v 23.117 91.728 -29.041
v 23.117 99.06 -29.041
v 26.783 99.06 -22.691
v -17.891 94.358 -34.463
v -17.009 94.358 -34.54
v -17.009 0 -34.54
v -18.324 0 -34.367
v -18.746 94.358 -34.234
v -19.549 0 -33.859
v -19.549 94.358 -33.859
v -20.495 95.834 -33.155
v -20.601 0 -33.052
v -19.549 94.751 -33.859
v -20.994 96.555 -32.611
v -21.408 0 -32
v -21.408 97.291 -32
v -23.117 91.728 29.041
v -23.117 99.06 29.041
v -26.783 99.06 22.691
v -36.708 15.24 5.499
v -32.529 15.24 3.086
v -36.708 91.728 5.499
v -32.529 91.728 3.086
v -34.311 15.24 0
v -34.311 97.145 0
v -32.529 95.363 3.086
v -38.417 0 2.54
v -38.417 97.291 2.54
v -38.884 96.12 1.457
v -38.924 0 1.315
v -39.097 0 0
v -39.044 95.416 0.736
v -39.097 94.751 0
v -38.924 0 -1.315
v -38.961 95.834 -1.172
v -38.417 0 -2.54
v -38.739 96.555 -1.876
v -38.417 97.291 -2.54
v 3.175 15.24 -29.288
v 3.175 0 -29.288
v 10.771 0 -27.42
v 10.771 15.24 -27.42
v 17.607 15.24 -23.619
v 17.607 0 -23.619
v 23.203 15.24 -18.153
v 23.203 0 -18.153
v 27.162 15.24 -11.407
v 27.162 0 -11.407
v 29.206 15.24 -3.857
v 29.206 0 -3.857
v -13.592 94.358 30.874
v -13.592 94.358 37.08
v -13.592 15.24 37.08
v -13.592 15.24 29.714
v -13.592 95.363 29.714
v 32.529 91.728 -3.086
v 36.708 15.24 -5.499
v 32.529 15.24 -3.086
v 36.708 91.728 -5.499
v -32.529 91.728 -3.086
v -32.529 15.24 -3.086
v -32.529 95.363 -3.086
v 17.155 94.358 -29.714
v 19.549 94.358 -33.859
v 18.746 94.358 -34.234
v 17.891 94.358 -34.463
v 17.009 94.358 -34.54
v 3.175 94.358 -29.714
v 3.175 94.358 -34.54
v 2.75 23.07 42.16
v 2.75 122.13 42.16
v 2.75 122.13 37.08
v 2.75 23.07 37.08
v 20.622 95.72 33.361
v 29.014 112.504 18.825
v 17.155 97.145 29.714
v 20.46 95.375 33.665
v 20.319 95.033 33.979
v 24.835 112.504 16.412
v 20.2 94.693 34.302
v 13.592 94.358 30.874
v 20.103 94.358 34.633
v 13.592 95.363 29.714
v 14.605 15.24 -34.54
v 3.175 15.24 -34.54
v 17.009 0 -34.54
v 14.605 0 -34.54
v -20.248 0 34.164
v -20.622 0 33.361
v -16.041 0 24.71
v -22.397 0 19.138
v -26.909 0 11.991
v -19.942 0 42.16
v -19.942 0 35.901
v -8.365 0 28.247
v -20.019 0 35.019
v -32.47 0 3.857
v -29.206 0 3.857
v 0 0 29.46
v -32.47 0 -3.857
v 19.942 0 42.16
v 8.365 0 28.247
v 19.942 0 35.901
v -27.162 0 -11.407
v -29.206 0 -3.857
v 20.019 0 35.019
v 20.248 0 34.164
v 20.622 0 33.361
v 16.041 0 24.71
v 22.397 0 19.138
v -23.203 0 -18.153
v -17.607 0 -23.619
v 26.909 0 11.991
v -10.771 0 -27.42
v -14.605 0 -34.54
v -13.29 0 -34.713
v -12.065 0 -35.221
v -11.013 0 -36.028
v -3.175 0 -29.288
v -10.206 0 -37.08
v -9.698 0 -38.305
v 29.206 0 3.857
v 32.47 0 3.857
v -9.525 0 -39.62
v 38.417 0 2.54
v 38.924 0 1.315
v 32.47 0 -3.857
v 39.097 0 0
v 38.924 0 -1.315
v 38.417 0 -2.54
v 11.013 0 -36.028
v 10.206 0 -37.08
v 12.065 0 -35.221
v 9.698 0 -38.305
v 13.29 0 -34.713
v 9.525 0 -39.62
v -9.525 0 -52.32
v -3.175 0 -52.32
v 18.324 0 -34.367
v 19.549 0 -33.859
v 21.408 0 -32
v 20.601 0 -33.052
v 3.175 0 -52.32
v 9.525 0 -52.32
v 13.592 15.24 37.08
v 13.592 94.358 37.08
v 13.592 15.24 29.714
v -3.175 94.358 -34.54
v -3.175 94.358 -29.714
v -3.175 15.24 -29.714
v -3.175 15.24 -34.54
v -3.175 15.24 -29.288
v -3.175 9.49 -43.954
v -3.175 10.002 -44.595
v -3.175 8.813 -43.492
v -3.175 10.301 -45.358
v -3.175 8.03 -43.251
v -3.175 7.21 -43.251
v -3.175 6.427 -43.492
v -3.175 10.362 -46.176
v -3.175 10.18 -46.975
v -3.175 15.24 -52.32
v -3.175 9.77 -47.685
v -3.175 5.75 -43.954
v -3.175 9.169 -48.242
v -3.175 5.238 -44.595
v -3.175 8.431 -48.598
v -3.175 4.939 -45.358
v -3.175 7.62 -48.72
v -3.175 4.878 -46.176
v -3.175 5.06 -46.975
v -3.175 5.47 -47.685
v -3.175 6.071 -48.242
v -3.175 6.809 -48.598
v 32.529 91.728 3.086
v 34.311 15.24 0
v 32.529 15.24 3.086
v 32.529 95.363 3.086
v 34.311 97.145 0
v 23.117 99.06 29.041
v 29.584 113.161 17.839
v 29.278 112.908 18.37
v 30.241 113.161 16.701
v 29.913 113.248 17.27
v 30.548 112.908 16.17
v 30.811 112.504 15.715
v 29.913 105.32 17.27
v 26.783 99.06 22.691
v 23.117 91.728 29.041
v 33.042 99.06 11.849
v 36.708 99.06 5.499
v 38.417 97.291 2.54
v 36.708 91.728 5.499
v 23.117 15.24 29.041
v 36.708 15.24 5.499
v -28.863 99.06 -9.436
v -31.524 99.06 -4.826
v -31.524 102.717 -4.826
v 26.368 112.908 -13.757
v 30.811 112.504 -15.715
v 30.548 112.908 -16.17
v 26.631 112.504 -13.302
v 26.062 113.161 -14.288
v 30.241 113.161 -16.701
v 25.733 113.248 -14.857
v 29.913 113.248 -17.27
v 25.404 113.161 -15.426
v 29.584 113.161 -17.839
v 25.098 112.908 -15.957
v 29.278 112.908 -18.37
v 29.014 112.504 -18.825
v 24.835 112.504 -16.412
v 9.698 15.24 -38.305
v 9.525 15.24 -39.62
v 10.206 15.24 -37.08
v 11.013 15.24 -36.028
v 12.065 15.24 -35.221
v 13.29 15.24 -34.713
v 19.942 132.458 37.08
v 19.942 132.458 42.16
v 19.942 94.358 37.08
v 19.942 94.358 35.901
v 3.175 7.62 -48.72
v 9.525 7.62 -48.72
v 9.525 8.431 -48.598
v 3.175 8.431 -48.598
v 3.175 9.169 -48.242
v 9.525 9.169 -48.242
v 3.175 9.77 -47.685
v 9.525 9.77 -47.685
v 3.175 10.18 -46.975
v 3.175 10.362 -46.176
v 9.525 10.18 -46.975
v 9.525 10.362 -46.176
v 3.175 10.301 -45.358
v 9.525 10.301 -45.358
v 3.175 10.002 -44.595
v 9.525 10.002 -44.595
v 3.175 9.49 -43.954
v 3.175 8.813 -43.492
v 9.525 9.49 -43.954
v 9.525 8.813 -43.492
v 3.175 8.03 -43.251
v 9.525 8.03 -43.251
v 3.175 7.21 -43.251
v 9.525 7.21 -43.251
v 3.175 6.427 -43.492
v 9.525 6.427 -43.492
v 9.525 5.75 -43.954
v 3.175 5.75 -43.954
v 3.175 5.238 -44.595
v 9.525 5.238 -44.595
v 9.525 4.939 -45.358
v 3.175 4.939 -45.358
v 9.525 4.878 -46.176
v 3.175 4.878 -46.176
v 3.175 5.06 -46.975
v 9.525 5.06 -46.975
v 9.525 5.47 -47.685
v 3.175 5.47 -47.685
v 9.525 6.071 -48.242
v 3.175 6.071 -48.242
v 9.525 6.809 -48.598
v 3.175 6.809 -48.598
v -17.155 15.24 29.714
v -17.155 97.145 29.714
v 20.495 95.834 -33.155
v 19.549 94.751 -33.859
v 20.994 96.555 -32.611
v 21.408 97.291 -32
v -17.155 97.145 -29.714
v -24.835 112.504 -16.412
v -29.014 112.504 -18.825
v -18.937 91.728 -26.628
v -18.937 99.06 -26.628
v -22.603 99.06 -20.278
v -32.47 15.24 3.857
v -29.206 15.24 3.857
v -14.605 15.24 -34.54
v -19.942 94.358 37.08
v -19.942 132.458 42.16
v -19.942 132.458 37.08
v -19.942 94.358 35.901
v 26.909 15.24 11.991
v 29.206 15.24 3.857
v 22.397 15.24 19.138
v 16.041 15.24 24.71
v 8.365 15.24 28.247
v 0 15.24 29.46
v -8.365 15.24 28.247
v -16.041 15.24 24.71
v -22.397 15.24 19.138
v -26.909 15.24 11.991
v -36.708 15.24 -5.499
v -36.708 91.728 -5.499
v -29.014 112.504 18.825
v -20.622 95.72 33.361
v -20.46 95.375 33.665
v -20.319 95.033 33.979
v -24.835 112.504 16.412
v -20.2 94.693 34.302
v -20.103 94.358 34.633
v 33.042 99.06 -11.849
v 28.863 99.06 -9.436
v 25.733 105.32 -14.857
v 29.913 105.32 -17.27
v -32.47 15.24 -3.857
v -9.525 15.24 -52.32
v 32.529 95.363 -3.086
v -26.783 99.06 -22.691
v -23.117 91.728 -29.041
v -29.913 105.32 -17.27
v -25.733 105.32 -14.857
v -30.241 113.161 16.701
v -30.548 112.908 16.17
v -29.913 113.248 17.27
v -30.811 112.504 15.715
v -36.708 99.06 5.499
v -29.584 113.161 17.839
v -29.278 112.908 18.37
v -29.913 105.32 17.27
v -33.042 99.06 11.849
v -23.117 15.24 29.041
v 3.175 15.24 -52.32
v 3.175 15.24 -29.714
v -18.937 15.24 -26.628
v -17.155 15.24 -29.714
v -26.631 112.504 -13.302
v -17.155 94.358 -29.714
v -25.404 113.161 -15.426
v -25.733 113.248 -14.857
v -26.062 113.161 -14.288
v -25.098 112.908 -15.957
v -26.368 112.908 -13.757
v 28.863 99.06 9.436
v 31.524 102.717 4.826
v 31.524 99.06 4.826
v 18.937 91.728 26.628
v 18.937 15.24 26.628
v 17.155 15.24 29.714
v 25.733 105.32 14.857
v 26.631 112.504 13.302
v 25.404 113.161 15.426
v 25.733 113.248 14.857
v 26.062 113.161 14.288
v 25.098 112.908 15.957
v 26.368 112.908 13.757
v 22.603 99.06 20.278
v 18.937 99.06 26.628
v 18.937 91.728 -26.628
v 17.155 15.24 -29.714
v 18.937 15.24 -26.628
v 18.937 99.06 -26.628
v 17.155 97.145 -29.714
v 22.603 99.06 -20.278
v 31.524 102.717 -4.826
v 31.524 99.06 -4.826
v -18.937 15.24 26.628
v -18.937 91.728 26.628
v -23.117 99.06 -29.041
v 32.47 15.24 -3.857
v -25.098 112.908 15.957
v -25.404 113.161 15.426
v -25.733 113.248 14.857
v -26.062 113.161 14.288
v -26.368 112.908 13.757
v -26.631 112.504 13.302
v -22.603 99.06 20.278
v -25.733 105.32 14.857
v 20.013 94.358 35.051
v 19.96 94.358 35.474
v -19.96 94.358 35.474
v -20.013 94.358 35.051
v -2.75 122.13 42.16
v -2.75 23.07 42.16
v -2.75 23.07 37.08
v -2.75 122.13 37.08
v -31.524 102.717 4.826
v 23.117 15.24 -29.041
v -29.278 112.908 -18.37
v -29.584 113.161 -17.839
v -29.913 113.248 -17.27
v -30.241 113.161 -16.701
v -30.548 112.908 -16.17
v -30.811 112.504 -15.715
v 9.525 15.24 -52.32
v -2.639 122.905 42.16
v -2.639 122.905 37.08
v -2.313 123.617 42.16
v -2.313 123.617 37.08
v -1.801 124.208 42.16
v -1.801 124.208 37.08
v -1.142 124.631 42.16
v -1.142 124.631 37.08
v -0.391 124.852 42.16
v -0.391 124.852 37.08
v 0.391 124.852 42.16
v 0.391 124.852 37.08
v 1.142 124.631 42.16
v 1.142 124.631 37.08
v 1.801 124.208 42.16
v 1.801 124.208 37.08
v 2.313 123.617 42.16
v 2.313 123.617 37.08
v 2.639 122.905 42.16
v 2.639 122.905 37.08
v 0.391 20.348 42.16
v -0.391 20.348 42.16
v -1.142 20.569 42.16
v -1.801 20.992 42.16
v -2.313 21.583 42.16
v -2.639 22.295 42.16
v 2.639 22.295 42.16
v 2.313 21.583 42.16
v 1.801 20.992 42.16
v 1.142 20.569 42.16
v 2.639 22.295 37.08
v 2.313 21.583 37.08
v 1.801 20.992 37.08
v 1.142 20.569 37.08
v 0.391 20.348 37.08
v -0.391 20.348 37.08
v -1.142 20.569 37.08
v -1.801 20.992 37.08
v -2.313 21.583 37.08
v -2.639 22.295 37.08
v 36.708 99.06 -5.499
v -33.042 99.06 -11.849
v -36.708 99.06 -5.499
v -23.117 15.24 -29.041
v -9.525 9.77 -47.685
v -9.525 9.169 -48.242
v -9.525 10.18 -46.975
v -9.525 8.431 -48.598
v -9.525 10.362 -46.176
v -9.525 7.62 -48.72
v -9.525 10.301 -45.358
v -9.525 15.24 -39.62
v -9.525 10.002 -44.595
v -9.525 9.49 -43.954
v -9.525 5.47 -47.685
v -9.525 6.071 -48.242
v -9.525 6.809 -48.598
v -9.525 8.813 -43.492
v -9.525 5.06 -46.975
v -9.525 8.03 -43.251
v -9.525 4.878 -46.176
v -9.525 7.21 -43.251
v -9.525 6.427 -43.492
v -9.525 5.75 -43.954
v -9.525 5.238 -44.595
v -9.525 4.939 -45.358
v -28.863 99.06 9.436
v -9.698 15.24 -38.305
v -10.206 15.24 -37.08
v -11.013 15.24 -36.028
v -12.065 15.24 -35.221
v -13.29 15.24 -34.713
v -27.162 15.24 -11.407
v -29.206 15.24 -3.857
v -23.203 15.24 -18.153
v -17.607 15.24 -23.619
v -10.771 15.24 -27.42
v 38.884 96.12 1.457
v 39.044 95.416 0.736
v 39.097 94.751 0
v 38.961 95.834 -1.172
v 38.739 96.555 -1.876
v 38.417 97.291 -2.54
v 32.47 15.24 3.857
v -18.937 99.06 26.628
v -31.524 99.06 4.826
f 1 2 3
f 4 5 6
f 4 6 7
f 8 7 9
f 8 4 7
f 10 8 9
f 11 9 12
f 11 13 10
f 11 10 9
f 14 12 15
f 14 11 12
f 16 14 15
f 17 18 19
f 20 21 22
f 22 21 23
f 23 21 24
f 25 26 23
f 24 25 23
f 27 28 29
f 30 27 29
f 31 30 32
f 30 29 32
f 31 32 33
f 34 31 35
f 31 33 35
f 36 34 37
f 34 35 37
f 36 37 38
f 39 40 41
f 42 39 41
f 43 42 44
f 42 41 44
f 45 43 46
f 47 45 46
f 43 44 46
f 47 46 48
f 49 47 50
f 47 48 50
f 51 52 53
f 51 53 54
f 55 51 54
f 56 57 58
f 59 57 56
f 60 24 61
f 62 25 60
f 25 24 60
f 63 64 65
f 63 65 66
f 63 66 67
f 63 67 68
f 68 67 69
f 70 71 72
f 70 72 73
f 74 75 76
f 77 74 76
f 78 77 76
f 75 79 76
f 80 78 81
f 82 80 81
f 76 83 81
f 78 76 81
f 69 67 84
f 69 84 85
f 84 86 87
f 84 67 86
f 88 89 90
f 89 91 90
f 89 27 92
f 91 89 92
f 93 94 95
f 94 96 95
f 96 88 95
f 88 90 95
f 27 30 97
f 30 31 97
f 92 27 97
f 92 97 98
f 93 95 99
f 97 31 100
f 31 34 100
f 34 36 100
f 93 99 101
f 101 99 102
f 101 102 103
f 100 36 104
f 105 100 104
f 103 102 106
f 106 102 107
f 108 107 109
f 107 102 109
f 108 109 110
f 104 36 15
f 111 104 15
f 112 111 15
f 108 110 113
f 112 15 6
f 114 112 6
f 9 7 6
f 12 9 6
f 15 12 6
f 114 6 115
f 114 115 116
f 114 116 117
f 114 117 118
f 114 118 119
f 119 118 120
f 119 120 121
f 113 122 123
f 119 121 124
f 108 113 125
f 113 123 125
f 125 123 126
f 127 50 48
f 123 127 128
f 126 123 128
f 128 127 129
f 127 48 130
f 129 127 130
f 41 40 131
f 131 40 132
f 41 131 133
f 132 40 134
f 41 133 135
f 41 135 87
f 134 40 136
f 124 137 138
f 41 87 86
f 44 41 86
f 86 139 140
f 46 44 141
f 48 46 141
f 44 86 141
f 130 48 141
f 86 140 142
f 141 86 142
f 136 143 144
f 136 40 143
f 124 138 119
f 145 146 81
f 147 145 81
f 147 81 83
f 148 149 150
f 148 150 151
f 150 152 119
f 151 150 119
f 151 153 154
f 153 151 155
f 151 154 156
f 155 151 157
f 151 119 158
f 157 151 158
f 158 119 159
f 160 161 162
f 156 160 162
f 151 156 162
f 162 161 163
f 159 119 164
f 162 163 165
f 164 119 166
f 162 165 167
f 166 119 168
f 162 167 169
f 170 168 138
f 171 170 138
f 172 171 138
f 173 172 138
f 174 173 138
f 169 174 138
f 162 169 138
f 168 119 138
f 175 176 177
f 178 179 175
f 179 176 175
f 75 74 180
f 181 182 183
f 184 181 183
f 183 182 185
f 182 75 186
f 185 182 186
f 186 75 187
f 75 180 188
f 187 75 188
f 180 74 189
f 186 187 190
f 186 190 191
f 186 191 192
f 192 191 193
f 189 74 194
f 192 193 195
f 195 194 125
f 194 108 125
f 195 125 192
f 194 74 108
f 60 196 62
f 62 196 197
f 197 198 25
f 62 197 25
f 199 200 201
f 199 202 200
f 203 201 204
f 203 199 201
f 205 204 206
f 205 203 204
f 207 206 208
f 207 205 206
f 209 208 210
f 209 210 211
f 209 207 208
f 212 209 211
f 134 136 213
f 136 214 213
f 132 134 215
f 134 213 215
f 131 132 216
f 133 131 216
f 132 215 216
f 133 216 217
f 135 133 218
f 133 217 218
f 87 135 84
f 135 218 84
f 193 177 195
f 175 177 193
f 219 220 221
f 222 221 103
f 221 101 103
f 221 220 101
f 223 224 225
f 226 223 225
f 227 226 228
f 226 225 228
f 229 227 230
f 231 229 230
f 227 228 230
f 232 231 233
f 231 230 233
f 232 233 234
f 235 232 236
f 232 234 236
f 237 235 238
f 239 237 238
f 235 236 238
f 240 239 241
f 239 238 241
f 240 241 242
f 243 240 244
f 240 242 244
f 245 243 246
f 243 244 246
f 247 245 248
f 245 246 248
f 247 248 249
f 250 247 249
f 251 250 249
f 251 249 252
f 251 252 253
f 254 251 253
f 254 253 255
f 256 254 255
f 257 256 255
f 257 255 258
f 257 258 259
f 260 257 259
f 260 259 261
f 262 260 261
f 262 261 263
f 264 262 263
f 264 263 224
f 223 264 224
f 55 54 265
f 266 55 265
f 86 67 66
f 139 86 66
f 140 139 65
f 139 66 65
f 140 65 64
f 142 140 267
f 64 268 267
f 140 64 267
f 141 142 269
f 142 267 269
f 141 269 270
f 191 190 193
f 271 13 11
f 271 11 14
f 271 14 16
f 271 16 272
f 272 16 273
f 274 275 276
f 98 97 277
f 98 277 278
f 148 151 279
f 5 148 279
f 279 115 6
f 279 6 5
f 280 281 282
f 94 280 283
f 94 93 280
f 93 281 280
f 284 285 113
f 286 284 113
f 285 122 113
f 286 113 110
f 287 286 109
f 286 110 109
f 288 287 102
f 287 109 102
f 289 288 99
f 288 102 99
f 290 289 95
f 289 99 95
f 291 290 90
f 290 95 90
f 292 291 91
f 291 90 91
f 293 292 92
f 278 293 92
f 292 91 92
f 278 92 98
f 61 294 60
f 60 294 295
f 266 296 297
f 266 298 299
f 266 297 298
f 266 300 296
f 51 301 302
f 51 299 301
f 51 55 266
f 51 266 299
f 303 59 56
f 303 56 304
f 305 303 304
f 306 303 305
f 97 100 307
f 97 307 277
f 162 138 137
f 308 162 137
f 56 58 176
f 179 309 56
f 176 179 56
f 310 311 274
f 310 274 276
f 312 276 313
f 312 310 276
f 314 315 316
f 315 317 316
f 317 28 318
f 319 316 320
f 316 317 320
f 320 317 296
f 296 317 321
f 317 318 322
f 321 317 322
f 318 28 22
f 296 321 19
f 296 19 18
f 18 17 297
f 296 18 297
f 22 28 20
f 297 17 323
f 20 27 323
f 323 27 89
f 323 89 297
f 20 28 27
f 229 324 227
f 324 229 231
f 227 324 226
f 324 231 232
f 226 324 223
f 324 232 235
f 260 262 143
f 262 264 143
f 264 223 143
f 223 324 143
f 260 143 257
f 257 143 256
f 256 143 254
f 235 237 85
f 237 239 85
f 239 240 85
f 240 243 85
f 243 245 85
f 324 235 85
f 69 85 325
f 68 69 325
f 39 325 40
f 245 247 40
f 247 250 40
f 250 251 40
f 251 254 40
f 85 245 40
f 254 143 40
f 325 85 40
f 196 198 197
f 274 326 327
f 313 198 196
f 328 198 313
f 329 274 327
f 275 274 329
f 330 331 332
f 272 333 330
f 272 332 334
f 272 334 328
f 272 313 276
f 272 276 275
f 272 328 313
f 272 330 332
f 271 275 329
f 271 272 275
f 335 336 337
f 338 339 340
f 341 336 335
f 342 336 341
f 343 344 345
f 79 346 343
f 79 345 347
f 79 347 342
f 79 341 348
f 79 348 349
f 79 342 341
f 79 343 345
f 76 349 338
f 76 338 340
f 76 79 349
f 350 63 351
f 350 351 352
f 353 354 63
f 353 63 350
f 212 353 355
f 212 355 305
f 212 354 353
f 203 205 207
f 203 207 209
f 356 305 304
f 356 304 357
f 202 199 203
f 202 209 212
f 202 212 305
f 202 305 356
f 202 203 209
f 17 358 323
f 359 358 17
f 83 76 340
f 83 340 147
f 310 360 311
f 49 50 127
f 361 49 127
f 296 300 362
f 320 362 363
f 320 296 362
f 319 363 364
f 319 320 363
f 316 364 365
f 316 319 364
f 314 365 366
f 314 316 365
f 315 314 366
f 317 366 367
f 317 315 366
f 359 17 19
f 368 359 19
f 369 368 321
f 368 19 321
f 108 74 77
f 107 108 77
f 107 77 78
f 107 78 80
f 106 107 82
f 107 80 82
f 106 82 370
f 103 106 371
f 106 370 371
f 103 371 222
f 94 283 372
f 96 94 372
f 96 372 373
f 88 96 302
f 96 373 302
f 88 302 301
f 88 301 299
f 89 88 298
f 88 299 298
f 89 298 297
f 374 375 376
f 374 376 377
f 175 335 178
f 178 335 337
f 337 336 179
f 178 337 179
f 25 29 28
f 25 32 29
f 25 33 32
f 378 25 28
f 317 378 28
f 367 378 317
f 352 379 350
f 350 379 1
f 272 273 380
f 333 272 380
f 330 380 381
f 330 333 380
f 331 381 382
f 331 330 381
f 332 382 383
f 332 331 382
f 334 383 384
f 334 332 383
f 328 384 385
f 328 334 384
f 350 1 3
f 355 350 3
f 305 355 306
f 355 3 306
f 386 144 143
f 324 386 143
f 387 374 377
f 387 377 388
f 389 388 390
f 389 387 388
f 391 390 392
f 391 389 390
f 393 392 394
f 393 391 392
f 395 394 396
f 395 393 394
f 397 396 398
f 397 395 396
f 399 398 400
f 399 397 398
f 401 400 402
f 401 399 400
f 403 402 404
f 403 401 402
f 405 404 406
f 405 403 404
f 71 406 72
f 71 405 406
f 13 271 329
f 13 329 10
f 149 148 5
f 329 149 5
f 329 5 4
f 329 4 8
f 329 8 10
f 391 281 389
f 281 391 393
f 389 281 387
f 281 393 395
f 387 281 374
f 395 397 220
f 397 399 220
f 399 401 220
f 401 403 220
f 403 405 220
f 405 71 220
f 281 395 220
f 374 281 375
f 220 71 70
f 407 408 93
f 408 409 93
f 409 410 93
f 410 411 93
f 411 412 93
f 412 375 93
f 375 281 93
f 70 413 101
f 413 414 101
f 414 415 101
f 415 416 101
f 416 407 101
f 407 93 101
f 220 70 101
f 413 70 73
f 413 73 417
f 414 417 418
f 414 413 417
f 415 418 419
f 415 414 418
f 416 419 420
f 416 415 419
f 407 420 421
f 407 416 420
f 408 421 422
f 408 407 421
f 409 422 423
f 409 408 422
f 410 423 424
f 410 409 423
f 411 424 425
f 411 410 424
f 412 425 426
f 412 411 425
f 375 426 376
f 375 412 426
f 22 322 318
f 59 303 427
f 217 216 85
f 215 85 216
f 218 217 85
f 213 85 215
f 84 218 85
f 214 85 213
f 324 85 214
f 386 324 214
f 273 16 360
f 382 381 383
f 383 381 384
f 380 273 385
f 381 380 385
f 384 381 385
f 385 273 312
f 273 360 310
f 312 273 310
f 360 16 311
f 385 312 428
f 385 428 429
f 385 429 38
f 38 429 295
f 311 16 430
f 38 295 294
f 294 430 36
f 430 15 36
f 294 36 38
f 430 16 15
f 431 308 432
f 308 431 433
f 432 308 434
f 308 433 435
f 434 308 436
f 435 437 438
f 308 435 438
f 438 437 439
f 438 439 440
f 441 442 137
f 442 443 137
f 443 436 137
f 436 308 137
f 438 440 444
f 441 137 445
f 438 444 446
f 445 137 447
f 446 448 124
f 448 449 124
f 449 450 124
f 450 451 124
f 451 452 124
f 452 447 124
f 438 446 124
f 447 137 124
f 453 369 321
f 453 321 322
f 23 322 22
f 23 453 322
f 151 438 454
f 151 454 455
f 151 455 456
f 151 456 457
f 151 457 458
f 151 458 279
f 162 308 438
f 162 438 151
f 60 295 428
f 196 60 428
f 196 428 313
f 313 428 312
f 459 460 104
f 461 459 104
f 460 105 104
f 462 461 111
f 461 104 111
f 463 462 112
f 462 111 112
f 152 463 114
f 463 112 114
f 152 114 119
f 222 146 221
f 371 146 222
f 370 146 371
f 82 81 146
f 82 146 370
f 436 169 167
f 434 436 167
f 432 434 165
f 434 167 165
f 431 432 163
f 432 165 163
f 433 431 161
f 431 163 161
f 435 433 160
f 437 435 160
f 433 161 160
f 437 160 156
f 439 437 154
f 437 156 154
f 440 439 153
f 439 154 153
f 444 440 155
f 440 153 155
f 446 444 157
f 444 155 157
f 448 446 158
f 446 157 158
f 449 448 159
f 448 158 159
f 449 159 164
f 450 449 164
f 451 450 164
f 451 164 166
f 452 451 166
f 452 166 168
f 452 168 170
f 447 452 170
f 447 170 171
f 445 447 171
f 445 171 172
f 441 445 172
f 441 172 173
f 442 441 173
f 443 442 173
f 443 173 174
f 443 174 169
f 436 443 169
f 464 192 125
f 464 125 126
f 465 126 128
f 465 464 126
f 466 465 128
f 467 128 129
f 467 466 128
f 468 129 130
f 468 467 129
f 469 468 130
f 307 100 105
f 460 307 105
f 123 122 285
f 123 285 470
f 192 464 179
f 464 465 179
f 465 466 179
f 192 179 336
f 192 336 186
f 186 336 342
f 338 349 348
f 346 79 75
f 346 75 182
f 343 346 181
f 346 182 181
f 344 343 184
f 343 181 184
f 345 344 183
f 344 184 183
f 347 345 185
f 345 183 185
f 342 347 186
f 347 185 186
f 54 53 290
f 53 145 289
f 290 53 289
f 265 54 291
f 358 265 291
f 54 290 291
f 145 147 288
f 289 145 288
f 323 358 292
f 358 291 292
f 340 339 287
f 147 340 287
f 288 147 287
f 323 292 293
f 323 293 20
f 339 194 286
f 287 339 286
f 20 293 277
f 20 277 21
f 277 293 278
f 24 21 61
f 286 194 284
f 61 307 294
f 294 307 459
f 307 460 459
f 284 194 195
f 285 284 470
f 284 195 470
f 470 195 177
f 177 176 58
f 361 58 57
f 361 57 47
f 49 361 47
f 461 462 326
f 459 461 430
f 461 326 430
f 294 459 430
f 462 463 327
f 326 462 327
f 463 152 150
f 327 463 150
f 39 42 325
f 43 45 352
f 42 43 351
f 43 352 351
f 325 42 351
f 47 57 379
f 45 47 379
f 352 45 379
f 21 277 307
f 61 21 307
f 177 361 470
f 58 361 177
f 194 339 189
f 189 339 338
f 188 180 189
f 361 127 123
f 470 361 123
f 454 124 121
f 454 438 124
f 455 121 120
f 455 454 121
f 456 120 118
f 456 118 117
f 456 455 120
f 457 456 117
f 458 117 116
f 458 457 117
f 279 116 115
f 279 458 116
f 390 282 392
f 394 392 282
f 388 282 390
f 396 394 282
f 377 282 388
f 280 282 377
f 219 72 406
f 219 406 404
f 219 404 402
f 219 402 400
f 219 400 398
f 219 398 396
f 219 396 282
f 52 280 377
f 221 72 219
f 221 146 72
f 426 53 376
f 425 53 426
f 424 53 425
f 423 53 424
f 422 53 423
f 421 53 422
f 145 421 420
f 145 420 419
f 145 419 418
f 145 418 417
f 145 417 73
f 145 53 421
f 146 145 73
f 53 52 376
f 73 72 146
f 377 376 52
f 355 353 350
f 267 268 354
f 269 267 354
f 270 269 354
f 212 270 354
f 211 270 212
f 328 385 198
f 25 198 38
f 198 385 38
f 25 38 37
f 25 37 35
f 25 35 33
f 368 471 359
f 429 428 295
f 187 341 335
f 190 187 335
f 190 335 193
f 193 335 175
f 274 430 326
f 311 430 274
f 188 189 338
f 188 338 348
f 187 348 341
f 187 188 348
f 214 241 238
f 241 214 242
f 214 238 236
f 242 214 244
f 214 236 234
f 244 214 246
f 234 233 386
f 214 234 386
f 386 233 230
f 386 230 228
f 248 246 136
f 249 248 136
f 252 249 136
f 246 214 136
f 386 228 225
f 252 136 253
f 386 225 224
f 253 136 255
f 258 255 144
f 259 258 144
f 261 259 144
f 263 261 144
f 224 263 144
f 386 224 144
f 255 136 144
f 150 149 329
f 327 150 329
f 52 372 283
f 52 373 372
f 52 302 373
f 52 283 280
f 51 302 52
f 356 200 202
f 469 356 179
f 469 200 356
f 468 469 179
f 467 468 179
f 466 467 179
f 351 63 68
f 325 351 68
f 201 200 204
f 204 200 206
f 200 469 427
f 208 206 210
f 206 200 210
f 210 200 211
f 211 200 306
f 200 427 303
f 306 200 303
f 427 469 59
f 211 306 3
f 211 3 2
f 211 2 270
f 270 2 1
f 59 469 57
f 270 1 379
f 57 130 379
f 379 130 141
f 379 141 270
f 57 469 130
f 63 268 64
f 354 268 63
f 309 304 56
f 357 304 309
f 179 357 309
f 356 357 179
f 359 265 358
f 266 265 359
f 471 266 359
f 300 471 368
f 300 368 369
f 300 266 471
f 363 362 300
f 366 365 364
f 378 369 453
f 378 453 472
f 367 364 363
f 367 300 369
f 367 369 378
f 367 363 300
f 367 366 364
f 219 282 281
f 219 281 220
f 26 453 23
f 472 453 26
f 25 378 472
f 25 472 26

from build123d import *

# Parameters (mm, degrees)
BOSS_EXTRUDE1_DEPTH  = 114.3
SKETCH2_W            = 6.35
SKETCH2_H            = 17.78
CUT_EXTRUDE2_DEPTH   = 99.06
SKETCH3_W            = 27.183356596
SKETCH3_H            = 83.82
CUT_EXTRUDE3_DEPTH   = 99.06
SKETCH4_W            = 27.183356596
SKETCH4_H            = 83.82
CUT_EXTRUDE4_DEPTH   = 99.06
SKETCH7_W            = 3.263536018
SKETCH7_H            = 7.713600016
CUT_EXTRUDE7_DEPTH   = 15.24
CUT_EXTRUDE8_DEPTH   = 99.06
SKETCH10_W           = 39.883356596
SKETCH10_H           = 114.3
BOSS_EXTRUDE2_DEPTH  = 7.62
CUT_EXTRUDE11_DEPTH  = 81.28
BOSS_EXTRUDE9_DEPTH  = 4.826
MIRROR9_COPY_1_DEPTH = 4.826
CUT_EXTRUDE13_DEPTH  = 19.941678176
CUT_EXTRUDE14_DEPTH  = 19.941678176
SKETCH17_W           = 27.183356538
SKETCH17_H           = 4.826
CUT_EXTRUDE15_DEPTH  = 99.06
SKETCH18_W           = 39.883356596
SKETCH18_H           = 7.62
CUT_EXTRUDE16_DEPTH  = 19.941678176
SKETCH20_W           = 27.183356538
SKETCH20_H           = 2.54
CUT_EXTRUDE19_DEPTH  = 79.118321824
FILLET1_R            = 5.08
FILLET2_R            = 2.54
SKETCH21_R           = 2.749999961
CUT_EXTRUDE20_DEPTH  = 79.118321824
SKETCH22_W           = 39.883356596
SKETCH22_H           = 5.08
BOSS_EXTRUDE10_DEPTH = 38.1
CUT_EXTRUDE21_REACH  = 169.333


with BuildPart() as part:
    # Sketch1 → Boss-Extrude1 (new body)
    with BuildSketch(Plane(origin=(0, 0, 0), x_dir=(1, 0, 0), z_dir=(0, 1, 0))):
        with BuildLine():
            Line((39.883356596, 0), (19.941678298, 34.54))
            Line((19.941678298, 34.54), (9.525, 34.54))
            Line((9.525, 34.54), (9.525, 52.32))
            Line((9.525, 52.32), (3.175, 52.32))
            Line((3.175, 52.32), (3.175, 34.54))
            Line((3.175, 34.54), (3.175, 29.28841025))
            ThreePointArc((3.175, 29.28841025), (0, -29.46), (-3.175, 29.28841025))
            Line((-3.175, 29.28841025), (-3.175, 34.54))
            Line((-3.175, 34.54), (-3.175, 52.32))
            Line((-3.175, 52.32), (-9.525, 52.32))
            Line((-9.525, 52.32), (-9.525, 34.54))
            Line((-9.525, 34.54), (-19.941678298, 34.54))
            Line((-19.941678298, 34.54), (-39.883356596, 0))
            Line((-39.883356596, 0), (-19.941678298, -34.54))
            Line((-19.941678298, -34.54), (19.941678298, -34.54))
            Line((19.941678298, -34.54), (39.883356596, 0))
        make_face()
    extrude(amount=BOSS_EXTRUDE1_DEPTH)

    # Sketch2 → Cut-Extrude2 (cut)
    with BuildSketch(Plane(origin=(0, 114.3, 0), x_dir=(1, 0, 0), z_dir=(0, 1, 0))):
        with Locations((-6.35, 43.43)):
            Rectangle(SKETCH2_W, SKETCH2_H)
        with Locations((6.35, 43.43)):
            Rectangle(SKETCH2_W, SKETCH2_H)
    extrude(amount=-CUT_EXTRUDE2_DEPTH, mode=Mode.SUBTRACT)

    # Sketch3 → Cut-Extrude3 (cut)
    with BuildSketch(Plane(origin=(-29.912517447, 0, -17.27), x_dir=(-0.49999999999999617, 0, 0.8660254037844409), z_dir=(-0.8660254037844408, 0, -0.4999999999999961))):
        with Locations((0, 57.15)):
            Rectangle(SKETCH3_W, SKETCH3_H)
    extrude(amount=-CUT_EXTRUDE3_DEPTH, mode=Mode.SUBTRACT)

    # Sketch4 → Cut-Extrude4 (cut)
    with BuildSketch(Plane(origin=(29.912517447, 0, -17.27), x_dir=(-0.500000000000004, 0, -0.8660254037844364), z_dir=(0.8660254037844365, 0, -0.500000000000004))):
        with Locations((0, 57.15)):
            Rectangle(SKETCH4_W, SKETCH4_H)
    extrude(amount=-CUT_EXTRUDE4_DEPTH, mode=Mode.SUBTRACT)

    # Sketch7 → Cut-Extrude7 (cut)
    with BuildSketch(Plane.XZ):
        with Locations((-30.838217531, 0)):
            Rectangle(SKETCH7_W, SKETCH7_H)
        with Locations((30.838217531, 0)):
            Rectangle(SKETCH7_W, SKETCH7_H)
    extrude(amount=-CUT_EXTRUDE7_DEPTH, mode=Mode.SUBTRACT)

    # Sketch8 → Cut-Extrude8 (cut)
    with BuildSketch(Plane(origin=(0, 114.3, 0), x_dir=(1, 0, 0), z_dir=(0, 1, 0))):
        Polygon((-3.175, 29.714), (3.175, 29.714), (17.155385899, 29.714), (34.310771797, 0), (17.155385899, -29.714), (-17.155385899, -29.714), (-34.310771797, 0), (-17.155385899, 29.714), align=None)
    extrude(amount=-CUT_EXTRUDE8_DEPTH, mode=Mode.SUBTRACT)

    # Sketch10 → Boss-Extrude2 (add)
    with BuildSketch(Plane.XY.offset(34.54)):
        with Locations((0, 57.15)):
            Rectangle(SKETCH10_W, SKETCH10_H)
    extrude(amount=BOSS_EXTRUDE2_DEPTH)

    # Sketch12 → Cut-Extrude11 (cut)
    with BuildSketch(Plane(origin=(-29.912517447, 0, -17.27), x_dir=(-0.4999999999999998, 0, 0.8660254037844388), z_dir=(-0.8660254037844388, 0, -0.4999999999999998))):
        Polygon((19.941678298, 114.3), (0, 114.3), (19.941678298, 94.358321702), align=None)
        Polygon((-19.941678298, 94.358321702), (0, 114.3), (-19.941678298, 114.3), align=None)
        Polygon((6.259743879, 99.06), (0, 105.319743879), (-6.259743879, 99.06), align=None)
    cut_extrude11 = extrude(amount=-CUT_EXTRUDE11_DEPTH, mode=Mode.SUBTRACT)

    # Mirror2: Cut-Extrude11 across plane
    add(cut_extrude11.mirror(Plane(origin=(0, 0, 0), x_dir=(0, 0, 1), z_dir=(1, 0, 0))), mode=Mode.SUBTRACT)

    # Sketch11 → Boss-Extrude9 (add)
    with BuildSketch(Plane(origin=(-29.912517447, 0, -17.27), x_dir=(-0.4999999999999998, 0, 0.8660254037844388), z_dir=(-0.8660254037844388, 0, -0.4999999999999998))):
        Polygon((-13.591678298, 91.728065581), (0, 105.319743879), (13.591678298, 91.728065581), (19.941678298, 94.358321702), (0, 114.3), (-19.941678298, 94.358321702), align=None)
    boss_extrude9 = extrude(amount=-BOSS_EXTRUDE9_DEPTH)

    # Mirror8: Boss-Extrude9 across plane
    add(boss_extrude9.mirror(Plane.XY))

    # Mirror9: Boss-Extrude9 across plane
    add(boss_extrude9.mirror(Plane(origin=(0, 0, 0), x_dir=(0, 0, 1), z_dir=(1, 0, 0))))

    # Mirror9 copy 1 sketch → Mirror9 copy 1 (add)
    with BuildSketch(Plane(origin=(29.912517447, 0, 17.27), x_dir=(0.4999999999999998, 0, -0.8660254037844388), z_dir=(0.8660254037844388, 0, 0.4999999999999998))):
        Polygon((-13.591678298, 91.728065581), (0, 105.319743879), (13.591678298, 91.728065581), (19.941678298, 94.358321702), (0, 114.3), (-19.941678298, 94.358321702), align=None)
    extrude(amount=-MIRROR9_COPY_1_DEPTH)

    # Sketch15 → Cut-Extrude13 (cut)
    with BuildSketch(Plane(origin=(0, 114.3, 0), x_dir=(1, 0, 0), z_dir=(0, 1, 0))):
        Polygon((-17.155385899, 29.714), (-19.941678298, 34.54), (19.941678298, 34.54), (17.155385899, 29.714), align=None)
    extrude(amount=-CUT_EXTRUDE13_DEPTH, mode=Mode.SUBTRACT)

    # Sketch16 → Cut-Extrude14 (cut)
    with BuildSketch(Plane(origin=(0, 114.3, 0), x_dir=(1, 0, 0), z_dir=(0, 1, 0))):
        Polygon((-19.941678298, -34.54), (19.941678298, -34.54), (11.5828011, -29.714), (-11.5828011, -29.714), align=None)
    extrude(amount=-CUT_EXTRUDE14_DEPTH, mode=Mode.SUBTRACT)

    # Sketch17 → Cut-Extrude15 (cut)
    with BuildSketch(Plane(origin=(0, 114.3, 0), x_dir=(1, 0, 0), z_dir=(0, 1, 0))):
        with Locations((0, -32.127)):
            Rectangle(SKETCH17_W, SKETCH17_H)
    extrude(amount=-CUT_EXTRUDE15_DEPTH, mode=Mode.SUBTRACT)

    # Sketch18 → Cut-Extrude16 (cut)
    with BuildSketch(Plane(origin=(0, 114.3, 0), x_dir=(1, 0, 0), z_dir=(0, 1, 0))):
        with Locations((0, -38.35)):
            Rectangle(SKETCH18_W, SKETCH18_H)
    extrude(amount=-CUT_EXTRUDE16_DEPTH, mode=Mode.SUBTRACT)

    # Sketch20 → Cut-Extrude19 (cut)
    with BuildSketch(Plane(origin=(0, 94.358321824, 0), x_dir=(1, 0, 0), z_dir=(0, 1, 0))):
        with Locations((0, -35.81)):
            Rectangle(SKETCH20_W, SKETCH20_H)
    extrude(amount=-CUT_EXTRUDE19_DEPTH, mode=Mode.SUBTRACT)

    # Fillet1
    fillet1_edges = [part.edges().sort_by_distance(p)[0] for p in [
        (19.941678298, 47.179160851, 34.54),
        (-39.883356596, 47.179160851, 0),
        (-19.941678298, 47.179160851, -34.54),
        (39.883356596, 47.179160851, 0),
        (-19.941678298, 47.179160851, 34.54),
        (19.941678298, 47.179160851, -34.54),
        (-9.525, 7.62, -34.54),
        (9.525, 7.62, -34.54),
    ]]
    fillet(fillet1_edges, radius=FILLET1_R)

    # Fillet2
    fillet2_edges = [part.edges().sort_by_distance(p)[0] for p in [
        (27.822798147, 114.3, 16.0635),
        (-27.822798147, 114.3, -16.0635),
        (-27.822798147, 114.3, 16.0635),
        (27.822798147, 114.3, -16.0635),
    ]]
    fillet(fillet2_edges, radius=FILLET2_R)

    # Sketch21 → Cut-Extrude20 (cut)
    with BuildSketch(Plane(origin=(9.525, 0, 0), x_dir=(0, 0, -1), z_dir=(1, 0, 0))):
        with Locations((45.97, 7.62)):
            Circle(SKETCH21_R)
    extrude(amount=-CUT_EXTRUDE20_DEPTH, mode=Mode.SUBTRACT)

    # Sketch22 → Boss-Extrude10 (add)
    with BuildSketch(Plane(origin=(0, 94.358321824, 0), x_dir=(1, 0, 0), z_dir=(0, 1, 0))):
        with Locations((0, -39.62)):
            Rectangle(SKETCH22_W, SKETCH22_H)
    extrude(amount=BOSS_EXTRUDE10_DEPTH)

    # Sketch23 → Cut-Extrude21 (cut, up to next)
    with BuildSketch(Plane.XY.offset(42.16), mode=Mode.PRIVATE) as cut_extrude21_sk1:
        with BuildLine():
            Line((2.75, 122.13), (2.75, 23.07))
            ThreePointArc((2.75, 23.07), (0, 20.32), (-2.75, 23.07))
            Line((-2.75, 23.07), (-2.75, 122.13))
            ThreePointArc((-2.75, 122.13), (0, 124.88), (2.75, 122.13))
        make_face()
    cut_extrude21_tool1 = extrude(cut_extrude21_sk1.sketch, amount=-CUT_EXTRUDE21_REACH, mode=Mode.PRIVATE) & part.part
    add(cut_extrude21_tool1.solids().sort_by_distance((0, 72.6, 42.16))[0], mode=Mode.SUBTRACT)


solid = part.part
